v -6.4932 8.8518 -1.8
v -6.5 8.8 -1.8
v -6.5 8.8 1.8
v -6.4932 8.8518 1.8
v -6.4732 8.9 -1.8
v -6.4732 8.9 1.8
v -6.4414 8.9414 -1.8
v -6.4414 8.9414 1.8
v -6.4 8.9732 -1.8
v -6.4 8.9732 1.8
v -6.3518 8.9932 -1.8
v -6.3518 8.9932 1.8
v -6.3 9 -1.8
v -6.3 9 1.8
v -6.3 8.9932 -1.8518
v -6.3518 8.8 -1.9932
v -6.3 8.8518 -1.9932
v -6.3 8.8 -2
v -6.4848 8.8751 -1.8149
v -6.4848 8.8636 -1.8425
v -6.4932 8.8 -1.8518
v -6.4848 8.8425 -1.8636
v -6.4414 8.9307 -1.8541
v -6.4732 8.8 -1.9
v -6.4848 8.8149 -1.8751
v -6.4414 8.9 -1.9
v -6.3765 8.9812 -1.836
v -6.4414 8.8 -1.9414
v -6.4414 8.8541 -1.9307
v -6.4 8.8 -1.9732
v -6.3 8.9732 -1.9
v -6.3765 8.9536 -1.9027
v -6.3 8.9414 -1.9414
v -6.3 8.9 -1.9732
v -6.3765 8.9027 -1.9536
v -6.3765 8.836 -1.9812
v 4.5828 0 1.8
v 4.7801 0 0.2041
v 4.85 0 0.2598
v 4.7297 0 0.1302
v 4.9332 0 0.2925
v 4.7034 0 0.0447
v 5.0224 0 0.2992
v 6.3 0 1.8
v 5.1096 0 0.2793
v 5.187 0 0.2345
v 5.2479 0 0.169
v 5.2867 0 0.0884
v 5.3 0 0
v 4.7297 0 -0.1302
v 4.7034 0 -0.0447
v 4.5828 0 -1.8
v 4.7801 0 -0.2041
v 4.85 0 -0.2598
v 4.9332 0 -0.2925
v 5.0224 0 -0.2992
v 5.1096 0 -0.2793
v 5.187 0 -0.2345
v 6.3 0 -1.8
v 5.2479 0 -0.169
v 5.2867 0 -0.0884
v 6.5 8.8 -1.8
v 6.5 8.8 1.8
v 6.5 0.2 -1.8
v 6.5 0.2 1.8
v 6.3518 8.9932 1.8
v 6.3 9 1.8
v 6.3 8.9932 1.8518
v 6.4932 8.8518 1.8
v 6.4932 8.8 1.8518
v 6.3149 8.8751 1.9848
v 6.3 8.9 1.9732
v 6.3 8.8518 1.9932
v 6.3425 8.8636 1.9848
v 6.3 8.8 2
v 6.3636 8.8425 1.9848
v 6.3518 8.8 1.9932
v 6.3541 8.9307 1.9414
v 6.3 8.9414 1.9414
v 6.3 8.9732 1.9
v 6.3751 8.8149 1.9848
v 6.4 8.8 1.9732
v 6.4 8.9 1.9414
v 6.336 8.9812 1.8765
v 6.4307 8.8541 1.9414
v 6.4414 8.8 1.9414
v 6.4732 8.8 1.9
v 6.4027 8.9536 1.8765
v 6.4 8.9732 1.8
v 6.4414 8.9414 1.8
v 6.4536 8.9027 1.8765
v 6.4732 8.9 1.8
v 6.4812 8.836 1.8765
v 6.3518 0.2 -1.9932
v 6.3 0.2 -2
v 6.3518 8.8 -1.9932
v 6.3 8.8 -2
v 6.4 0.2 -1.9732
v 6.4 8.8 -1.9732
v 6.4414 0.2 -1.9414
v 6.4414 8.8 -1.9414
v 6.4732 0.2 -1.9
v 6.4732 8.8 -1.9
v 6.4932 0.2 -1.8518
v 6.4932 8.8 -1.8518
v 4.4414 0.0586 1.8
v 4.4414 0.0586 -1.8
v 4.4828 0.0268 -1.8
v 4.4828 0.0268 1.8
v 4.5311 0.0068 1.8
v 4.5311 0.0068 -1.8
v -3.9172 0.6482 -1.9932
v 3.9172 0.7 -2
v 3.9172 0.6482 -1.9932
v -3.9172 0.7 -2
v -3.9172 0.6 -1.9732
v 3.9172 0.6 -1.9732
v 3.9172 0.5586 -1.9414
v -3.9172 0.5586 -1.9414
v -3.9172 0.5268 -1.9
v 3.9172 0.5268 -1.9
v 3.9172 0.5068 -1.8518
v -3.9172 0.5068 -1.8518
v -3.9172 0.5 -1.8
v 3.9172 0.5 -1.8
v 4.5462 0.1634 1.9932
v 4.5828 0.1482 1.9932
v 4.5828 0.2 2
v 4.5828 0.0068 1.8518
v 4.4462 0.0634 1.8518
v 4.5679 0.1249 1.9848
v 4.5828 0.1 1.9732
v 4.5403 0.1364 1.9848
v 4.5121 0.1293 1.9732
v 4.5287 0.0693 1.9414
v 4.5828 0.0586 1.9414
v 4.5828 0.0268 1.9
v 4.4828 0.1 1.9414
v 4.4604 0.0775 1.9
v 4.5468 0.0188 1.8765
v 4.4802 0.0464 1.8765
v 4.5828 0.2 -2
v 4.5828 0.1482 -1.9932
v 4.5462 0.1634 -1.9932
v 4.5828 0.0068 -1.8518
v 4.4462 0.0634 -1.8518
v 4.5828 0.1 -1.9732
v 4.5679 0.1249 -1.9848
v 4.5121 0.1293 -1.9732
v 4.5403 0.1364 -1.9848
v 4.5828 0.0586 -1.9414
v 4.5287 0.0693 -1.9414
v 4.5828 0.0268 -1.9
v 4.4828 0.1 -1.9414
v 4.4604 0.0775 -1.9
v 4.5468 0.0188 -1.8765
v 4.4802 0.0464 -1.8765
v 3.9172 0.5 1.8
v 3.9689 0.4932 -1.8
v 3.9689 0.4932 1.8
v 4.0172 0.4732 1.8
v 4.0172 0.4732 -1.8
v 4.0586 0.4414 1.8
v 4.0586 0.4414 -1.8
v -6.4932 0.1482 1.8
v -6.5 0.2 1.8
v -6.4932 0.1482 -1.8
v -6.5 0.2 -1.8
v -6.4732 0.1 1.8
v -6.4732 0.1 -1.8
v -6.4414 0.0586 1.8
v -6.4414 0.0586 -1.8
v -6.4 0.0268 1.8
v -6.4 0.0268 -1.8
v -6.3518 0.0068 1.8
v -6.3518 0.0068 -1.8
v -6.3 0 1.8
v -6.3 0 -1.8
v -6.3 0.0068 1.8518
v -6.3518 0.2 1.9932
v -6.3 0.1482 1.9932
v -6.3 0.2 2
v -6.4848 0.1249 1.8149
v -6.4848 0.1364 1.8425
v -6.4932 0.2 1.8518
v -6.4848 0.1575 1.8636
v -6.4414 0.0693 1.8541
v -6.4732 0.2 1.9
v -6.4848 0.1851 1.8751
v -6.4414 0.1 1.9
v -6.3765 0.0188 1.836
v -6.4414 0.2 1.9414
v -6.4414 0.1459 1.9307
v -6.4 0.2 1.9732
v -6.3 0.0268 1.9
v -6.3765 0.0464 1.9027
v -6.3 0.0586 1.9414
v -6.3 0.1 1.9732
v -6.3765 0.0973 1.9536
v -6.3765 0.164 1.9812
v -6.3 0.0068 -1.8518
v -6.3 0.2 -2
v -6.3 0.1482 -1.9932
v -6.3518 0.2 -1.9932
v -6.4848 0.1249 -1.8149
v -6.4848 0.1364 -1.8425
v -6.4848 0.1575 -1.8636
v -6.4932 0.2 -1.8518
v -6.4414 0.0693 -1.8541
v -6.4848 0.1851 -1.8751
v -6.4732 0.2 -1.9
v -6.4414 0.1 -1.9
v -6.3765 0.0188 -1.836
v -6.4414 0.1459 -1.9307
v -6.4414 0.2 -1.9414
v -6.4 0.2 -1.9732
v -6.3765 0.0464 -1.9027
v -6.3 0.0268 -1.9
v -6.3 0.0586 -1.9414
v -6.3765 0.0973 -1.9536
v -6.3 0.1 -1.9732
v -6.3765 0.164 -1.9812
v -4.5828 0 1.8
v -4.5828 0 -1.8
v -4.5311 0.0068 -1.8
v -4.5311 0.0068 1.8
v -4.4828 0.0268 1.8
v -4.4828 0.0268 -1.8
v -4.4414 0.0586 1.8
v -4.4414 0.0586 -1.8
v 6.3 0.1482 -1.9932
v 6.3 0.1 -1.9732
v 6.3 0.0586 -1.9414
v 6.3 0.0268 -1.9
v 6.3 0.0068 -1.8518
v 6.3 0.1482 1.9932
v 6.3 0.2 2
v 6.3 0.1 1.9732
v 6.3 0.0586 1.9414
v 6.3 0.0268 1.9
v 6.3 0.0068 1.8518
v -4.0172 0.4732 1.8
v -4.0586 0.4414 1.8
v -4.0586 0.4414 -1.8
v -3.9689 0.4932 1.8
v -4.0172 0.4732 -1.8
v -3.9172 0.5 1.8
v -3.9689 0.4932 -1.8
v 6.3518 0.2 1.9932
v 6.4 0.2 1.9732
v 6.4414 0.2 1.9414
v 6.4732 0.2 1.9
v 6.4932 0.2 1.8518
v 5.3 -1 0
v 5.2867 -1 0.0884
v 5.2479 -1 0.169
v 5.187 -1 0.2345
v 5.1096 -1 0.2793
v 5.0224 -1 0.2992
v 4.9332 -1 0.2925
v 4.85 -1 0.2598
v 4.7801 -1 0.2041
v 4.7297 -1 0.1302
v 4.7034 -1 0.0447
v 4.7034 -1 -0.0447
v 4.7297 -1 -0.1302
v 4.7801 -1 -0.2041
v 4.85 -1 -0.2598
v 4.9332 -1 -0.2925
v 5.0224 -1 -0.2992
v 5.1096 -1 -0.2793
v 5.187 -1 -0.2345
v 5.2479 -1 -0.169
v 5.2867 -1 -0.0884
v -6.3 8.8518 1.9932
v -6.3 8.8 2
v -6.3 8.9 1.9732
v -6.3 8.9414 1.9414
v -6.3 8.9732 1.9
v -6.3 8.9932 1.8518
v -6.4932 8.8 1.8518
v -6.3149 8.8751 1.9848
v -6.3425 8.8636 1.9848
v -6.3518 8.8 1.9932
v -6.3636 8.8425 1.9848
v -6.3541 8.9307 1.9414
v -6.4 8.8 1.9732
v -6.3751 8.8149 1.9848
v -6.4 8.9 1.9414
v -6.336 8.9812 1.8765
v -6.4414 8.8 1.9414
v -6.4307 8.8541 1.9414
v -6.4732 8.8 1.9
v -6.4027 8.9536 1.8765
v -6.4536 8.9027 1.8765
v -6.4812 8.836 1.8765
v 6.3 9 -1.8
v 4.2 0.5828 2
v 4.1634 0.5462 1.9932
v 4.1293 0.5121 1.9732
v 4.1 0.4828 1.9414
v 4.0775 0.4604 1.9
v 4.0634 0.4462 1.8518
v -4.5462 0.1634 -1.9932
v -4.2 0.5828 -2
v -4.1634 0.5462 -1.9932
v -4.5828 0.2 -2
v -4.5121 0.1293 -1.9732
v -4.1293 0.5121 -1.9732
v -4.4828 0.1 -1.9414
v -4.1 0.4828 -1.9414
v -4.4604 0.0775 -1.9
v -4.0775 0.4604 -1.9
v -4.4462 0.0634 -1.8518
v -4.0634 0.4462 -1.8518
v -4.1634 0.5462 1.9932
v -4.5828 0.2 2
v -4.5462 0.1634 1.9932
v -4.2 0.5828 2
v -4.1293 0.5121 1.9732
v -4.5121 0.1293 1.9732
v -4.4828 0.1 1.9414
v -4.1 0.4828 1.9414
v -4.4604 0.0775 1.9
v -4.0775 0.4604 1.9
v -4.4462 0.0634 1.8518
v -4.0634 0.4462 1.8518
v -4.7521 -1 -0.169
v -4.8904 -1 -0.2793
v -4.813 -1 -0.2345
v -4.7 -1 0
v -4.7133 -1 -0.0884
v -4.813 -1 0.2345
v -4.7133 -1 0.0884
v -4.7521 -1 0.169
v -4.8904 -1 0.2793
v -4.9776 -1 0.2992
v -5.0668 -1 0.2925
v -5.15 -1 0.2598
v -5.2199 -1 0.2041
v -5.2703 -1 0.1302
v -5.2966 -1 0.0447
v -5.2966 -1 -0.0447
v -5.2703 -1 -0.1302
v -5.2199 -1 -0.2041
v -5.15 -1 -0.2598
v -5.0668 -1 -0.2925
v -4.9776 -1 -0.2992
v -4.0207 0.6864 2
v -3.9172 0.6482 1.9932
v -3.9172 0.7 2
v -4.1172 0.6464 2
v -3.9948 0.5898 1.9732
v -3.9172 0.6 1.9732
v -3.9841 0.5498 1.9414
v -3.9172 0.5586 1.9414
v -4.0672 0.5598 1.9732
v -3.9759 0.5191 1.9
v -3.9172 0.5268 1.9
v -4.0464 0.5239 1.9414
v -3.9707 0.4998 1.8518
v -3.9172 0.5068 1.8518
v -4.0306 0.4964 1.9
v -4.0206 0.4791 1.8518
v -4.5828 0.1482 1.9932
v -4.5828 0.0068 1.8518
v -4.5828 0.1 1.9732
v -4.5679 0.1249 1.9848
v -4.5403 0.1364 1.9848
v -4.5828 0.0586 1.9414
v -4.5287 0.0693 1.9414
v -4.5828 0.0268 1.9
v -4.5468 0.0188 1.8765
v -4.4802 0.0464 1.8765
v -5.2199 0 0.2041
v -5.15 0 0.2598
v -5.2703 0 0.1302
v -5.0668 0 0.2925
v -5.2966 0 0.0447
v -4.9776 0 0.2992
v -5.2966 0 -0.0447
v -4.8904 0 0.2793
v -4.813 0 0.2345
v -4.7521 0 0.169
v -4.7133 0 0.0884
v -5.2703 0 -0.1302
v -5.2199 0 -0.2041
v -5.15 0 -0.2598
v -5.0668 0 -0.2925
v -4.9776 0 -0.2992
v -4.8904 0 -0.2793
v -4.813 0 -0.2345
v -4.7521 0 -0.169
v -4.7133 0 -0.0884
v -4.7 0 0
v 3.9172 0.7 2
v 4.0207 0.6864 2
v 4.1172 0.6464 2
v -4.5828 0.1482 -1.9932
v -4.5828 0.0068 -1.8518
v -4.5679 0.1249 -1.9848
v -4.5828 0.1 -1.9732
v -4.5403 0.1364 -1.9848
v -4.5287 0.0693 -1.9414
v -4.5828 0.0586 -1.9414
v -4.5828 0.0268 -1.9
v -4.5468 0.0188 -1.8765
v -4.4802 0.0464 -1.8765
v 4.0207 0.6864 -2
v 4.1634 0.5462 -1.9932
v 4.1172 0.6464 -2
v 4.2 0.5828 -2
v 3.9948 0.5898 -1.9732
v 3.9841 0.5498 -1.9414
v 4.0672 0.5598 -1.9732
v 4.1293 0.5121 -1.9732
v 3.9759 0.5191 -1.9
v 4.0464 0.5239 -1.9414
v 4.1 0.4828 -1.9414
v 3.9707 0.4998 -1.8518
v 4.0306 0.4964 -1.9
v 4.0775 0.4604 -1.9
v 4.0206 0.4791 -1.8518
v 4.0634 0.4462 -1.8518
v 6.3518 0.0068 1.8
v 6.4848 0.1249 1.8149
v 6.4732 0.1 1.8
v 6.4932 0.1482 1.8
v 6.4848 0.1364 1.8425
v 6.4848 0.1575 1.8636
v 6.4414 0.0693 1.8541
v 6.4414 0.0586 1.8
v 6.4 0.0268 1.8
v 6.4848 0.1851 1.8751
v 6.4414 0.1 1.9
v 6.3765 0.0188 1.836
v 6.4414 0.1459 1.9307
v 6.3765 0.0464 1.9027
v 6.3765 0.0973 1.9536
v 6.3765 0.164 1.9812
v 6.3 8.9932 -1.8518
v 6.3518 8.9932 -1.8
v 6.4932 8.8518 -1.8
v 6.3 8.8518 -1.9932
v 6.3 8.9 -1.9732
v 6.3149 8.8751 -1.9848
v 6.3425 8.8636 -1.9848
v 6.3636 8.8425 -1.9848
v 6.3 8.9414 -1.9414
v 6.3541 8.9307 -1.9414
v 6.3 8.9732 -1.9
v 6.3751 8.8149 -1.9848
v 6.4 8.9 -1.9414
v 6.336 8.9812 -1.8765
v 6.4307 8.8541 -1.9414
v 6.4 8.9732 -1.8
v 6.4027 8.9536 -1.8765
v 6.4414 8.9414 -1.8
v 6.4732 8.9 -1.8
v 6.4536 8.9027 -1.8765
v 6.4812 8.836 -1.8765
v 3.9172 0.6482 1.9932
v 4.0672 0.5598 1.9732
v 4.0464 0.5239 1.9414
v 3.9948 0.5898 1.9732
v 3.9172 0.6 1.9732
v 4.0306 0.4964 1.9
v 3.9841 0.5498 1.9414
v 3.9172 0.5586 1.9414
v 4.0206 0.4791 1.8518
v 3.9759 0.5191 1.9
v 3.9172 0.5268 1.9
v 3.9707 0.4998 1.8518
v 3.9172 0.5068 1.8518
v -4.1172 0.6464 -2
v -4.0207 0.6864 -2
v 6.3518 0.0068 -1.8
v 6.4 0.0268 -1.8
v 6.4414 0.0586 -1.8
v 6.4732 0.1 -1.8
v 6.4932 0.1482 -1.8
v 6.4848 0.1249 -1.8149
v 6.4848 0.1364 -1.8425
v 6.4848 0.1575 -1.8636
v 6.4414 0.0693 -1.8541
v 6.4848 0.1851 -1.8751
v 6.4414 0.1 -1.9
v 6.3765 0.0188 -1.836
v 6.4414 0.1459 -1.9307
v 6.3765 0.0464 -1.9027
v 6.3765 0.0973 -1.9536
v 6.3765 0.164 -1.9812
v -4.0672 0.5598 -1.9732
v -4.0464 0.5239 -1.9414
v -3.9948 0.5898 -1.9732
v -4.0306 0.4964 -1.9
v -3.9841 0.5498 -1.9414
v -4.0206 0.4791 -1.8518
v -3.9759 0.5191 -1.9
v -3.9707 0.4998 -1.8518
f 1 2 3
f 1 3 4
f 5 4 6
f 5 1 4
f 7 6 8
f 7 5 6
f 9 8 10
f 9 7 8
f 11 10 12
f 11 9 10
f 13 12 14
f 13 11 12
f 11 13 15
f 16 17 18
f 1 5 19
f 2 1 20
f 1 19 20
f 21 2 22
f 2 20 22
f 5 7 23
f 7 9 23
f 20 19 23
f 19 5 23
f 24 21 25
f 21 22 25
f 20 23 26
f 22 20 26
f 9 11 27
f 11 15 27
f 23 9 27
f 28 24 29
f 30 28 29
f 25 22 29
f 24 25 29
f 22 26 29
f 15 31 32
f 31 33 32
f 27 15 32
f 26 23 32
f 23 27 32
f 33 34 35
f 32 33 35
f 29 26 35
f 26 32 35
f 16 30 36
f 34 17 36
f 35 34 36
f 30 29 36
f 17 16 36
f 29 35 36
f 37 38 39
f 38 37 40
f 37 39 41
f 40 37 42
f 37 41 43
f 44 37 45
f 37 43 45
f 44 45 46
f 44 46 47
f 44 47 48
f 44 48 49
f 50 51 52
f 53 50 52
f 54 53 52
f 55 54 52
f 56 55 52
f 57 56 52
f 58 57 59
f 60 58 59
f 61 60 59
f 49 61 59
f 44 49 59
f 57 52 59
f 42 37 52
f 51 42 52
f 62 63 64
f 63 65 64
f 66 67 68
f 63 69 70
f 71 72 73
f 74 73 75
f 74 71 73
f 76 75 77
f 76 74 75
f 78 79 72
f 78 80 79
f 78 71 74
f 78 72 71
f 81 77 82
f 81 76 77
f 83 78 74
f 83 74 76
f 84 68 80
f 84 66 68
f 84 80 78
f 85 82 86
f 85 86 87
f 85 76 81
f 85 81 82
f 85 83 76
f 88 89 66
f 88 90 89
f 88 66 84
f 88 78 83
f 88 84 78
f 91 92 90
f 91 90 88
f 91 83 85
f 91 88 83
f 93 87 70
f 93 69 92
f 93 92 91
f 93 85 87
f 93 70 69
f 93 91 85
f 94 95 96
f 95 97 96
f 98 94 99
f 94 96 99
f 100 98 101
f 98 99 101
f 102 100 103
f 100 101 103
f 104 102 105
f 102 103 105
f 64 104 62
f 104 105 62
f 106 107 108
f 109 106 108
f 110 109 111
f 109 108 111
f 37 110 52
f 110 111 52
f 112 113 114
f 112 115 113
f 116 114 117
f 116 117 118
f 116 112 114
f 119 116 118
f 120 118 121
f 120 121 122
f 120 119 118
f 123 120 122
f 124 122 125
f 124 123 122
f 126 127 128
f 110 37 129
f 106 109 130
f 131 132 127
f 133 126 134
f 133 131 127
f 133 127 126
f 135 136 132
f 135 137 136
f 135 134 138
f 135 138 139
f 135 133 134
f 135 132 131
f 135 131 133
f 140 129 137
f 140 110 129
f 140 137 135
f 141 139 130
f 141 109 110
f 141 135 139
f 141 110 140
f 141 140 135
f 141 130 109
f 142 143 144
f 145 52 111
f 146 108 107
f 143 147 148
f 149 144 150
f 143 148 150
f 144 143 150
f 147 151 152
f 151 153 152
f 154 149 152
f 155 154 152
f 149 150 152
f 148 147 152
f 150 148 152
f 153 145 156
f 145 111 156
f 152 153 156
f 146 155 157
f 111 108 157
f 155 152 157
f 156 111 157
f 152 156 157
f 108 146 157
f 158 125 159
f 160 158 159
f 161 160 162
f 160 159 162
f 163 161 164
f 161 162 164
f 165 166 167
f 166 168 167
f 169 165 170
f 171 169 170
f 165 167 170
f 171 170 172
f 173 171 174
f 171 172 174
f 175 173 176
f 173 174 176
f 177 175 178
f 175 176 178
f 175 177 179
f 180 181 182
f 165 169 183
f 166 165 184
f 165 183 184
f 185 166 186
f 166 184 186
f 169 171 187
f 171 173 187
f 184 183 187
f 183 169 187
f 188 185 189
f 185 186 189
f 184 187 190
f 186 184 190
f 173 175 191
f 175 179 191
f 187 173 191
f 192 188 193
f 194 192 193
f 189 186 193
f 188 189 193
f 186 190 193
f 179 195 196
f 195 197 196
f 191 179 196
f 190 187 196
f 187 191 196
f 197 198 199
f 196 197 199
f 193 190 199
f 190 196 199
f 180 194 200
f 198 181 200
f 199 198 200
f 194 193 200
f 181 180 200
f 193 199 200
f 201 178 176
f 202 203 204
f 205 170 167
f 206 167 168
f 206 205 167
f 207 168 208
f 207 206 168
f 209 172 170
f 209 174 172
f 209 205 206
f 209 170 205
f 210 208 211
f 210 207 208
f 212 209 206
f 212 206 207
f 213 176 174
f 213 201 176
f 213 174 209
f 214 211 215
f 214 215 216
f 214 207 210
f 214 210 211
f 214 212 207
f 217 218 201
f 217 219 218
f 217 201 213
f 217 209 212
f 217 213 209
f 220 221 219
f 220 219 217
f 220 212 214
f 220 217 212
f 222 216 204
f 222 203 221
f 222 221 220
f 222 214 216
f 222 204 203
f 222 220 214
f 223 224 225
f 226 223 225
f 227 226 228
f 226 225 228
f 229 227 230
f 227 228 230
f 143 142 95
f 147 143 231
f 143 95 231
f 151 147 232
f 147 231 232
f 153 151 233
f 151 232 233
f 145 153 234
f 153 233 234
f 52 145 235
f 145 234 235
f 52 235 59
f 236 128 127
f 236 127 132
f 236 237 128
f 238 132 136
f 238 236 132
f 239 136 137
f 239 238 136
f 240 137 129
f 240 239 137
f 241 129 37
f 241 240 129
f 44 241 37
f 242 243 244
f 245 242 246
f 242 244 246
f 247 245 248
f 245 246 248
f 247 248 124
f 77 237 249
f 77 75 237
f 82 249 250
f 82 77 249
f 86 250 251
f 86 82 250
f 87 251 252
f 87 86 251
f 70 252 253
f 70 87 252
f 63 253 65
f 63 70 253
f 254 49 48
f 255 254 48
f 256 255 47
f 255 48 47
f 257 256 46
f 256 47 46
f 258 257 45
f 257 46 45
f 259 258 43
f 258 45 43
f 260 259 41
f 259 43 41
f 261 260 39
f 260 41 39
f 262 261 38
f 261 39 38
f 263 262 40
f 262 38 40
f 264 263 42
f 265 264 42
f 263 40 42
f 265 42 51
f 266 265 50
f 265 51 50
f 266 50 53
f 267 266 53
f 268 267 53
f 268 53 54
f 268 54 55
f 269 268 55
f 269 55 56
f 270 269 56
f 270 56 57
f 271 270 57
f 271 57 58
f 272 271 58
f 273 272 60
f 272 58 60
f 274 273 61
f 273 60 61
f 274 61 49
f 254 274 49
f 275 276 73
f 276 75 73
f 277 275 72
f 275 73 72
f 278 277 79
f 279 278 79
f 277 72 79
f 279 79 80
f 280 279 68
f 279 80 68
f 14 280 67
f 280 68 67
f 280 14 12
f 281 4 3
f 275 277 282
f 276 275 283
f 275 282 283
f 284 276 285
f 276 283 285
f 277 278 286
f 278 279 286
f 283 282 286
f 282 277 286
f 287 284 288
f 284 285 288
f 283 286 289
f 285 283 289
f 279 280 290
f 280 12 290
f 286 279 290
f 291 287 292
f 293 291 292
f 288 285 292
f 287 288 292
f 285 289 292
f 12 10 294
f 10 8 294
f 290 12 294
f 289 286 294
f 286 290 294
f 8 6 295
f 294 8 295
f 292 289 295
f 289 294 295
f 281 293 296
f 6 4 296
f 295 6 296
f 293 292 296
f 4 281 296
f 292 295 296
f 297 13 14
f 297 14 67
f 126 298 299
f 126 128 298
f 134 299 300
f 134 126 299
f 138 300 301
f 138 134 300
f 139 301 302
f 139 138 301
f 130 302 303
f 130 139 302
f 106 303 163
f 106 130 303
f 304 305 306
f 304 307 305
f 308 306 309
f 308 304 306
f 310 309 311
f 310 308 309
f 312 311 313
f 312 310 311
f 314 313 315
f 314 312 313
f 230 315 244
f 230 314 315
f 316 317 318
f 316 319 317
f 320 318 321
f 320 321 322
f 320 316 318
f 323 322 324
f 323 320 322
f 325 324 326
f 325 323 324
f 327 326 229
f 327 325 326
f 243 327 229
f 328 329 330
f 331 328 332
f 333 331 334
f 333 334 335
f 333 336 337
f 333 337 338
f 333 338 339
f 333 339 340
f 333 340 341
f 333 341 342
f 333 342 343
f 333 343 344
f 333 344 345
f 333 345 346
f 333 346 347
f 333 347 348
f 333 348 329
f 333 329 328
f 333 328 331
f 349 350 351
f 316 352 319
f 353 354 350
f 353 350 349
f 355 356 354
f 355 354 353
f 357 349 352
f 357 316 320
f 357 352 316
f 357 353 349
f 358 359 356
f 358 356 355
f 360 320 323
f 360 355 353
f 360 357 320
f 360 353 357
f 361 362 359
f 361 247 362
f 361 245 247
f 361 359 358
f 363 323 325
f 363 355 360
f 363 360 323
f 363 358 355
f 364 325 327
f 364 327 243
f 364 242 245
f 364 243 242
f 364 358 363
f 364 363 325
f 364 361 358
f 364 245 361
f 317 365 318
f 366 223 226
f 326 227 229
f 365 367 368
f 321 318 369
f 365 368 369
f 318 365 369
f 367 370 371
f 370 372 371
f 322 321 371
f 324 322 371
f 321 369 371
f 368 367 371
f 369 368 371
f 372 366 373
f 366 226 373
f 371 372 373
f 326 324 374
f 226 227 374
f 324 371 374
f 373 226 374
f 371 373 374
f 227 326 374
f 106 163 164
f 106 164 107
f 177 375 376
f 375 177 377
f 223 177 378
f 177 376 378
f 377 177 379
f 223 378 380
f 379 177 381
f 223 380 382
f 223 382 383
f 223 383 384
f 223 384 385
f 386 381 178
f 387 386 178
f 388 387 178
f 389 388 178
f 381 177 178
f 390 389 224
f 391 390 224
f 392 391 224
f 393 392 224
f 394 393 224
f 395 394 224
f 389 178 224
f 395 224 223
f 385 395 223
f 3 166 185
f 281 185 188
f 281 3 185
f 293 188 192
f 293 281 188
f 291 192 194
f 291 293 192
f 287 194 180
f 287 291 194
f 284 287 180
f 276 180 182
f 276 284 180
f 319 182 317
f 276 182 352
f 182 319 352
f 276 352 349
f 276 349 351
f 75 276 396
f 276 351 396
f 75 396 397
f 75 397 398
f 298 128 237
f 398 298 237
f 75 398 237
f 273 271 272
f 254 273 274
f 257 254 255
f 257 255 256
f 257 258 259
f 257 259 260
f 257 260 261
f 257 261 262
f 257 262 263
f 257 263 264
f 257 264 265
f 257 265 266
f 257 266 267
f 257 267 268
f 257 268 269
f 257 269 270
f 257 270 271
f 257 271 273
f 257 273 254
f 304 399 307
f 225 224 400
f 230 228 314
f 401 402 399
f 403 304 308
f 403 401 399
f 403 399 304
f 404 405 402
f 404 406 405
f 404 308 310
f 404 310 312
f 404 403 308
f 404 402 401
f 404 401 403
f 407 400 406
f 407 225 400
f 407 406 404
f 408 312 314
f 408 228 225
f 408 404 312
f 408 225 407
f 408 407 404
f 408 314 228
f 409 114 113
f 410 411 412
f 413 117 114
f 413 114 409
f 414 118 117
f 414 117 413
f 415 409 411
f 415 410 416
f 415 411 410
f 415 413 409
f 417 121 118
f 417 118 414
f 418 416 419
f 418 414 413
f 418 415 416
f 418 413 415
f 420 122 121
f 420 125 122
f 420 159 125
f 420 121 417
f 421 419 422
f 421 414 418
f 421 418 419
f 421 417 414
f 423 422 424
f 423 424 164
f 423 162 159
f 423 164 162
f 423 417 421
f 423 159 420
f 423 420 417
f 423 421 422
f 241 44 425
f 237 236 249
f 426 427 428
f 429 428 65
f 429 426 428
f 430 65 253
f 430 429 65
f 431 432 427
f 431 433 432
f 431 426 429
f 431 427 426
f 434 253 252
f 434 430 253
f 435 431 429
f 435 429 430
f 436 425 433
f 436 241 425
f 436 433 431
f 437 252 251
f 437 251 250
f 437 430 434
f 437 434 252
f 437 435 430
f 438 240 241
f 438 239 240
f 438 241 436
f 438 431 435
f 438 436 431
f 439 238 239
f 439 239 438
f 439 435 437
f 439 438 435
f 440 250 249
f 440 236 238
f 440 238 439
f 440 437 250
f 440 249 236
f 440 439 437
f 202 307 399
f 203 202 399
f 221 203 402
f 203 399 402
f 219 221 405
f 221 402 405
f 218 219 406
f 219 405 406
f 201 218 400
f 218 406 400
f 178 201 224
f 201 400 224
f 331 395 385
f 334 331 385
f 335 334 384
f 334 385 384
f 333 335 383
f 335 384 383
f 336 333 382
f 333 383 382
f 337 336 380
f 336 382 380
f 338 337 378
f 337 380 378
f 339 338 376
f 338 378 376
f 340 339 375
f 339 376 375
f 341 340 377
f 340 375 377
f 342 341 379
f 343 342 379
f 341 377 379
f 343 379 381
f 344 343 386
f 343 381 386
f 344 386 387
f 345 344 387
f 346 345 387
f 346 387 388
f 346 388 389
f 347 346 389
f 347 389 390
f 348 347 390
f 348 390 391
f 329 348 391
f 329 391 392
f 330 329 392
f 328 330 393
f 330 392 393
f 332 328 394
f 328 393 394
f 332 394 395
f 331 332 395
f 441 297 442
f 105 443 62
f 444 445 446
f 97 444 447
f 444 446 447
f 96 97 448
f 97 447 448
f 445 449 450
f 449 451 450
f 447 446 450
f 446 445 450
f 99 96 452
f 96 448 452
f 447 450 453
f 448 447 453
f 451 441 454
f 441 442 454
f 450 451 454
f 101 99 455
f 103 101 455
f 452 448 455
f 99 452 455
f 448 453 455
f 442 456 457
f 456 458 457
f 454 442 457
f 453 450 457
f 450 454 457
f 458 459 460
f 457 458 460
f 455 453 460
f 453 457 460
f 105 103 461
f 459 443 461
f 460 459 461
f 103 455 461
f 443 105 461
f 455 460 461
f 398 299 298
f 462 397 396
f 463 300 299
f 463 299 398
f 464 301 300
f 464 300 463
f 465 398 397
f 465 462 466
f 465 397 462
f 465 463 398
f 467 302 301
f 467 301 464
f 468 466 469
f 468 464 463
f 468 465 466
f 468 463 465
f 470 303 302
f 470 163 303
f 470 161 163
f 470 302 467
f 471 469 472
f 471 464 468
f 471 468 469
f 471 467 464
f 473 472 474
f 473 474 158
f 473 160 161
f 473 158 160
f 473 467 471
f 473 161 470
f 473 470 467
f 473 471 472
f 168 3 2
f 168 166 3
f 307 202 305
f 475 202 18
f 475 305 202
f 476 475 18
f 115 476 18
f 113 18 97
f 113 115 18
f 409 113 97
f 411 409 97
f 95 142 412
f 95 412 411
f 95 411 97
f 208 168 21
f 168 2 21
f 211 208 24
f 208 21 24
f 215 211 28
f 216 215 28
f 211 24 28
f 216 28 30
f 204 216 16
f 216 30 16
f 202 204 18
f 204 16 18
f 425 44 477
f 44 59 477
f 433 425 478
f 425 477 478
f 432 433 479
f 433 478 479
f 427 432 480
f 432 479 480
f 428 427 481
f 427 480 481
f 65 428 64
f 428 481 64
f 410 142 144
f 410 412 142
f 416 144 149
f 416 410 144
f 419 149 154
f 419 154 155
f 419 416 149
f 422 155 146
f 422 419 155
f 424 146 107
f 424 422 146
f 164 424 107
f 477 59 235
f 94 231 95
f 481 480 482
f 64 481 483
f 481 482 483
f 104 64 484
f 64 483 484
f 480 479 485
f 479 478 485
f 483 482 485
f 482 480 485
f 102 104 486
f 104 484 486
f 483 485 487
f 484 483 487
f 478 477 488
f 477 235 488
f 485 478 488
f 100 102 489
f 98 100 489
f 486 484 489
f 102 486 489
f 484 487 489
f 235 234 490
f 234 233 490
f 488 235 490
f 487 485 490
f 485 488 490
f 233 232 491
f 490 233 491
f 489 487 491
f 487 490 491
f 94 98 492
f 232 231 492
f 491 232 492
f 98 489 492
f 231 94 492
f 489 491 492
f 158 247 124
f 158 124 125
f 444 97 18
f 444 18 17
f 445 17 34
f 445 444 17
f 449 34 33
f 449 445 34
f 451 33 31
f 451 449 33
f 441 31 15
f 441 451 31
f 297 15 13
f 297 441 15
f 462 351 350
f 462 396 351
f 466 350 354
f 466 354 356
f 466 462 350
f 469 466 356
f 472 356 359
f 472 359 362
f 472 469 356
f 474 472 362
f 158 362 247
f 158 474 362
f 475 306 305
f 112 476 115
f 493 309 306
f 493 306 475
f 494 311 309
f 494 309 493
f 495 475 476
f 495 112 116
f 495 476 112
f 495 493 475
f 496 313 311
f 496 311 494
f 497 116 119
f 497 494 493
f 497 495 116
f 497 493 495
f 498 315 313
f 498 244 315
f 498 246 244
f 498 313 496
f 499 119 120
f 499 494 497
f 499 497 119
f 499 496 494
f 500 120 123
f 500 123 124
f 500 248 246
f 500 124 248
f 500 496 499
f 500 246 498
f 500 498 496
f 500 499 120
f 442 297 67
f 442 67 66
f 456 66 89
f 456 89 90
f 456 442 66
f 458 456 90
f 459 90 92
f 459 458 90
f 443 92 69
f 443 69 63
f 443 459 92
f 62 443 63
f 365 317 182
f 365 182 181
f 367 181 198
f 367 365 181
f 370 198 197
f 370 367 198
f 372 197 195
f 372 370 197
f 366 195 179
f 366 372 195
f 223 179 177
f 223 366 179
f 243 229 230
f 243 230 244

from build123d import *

# Parameters (mm, degrees)
SKETCH1_W           = 13
SKETCH1_H           = 4
BOSS_EXTRUDE1_DEPTH = 9
CUT_EXTRUDE1_DEPTH  = 5
SKETCH3_R           = 0.3
BOSS_EXTRUDE2_DEPTH = 1
FILLET1_R           = 0.2


with BuildPart() as part:
    # Sketch1 → Boss-Extrude1 (new body)
    with BuildSketch(Plane(origin=(0, 0, 0), x_dir=(1, 0, 0), z_dir=(0, 1, 0))):
        Rectangle(SKETCH1_W, SKETCH1_H)
    extrude(amount=BOSS_EXTRUDE1_DEPTH)

    # Sketch2 → Cut-Extrude1 (cut, through all)
    with BuildSketch(Plane.XY.offset(2)):
        Polygon((-4.5, 0), (-4, 0.5), (4, 0.5), (4.5, 0), (4.5, -1.5), (-4.5, -1.5), align=None)
    extrude(amount=-CUT_EXTRUDE1_DEPTH, mode=Mode.SUBTRACT)

    # Sketch3 → Boss-Extrude2 (add)
    with BuildSketch(Plane.XZ):
        with Locations((5, 0)):
            Circle(SKETCH3_R)
        with Locations((-5, 0)):
            Circle(SKETCH3_R)
    extrude(amount=BOSS_EXTRUDE2_DEPTH)

    # Fillet1
    fillet1_edges = [part.edges().sort_by_distance(p)[0] for p in [
        (6.5, 9, 0),
        (0, 9, -2),
        (-5.5, 0, -2),
        (5.5, 0, 2),
        (4.25, 0.25, 2),
        (0, 0.5, 2),
        (-4.25, 0.25, 2),
        (-4.25, 0.25, -2),
        (-4.5, 0, 0),
        (0, 0.5, -2),
        (-4, 0.5, 0),
        (4.25, 0.25, -2),
        (4, 0.5, 0),
        (4.5, 0, 0),
        (-6.5, 9, 0),
        (5.5, 0, -2),
        (6.5, 0, 0),
        (-5.5, 0, 2),
        (-6.5, 0, 0),
        (0, 9, 2),
        (-6.5, 4.5, -2),
        (6.5, 4.5, -2),
        (6.5, 4.5, 2),
        (-6.5, 4.5, 2),
    ]]
    fillet(fillet1_edges, radius=FILLET1_R)


solid = part.part
